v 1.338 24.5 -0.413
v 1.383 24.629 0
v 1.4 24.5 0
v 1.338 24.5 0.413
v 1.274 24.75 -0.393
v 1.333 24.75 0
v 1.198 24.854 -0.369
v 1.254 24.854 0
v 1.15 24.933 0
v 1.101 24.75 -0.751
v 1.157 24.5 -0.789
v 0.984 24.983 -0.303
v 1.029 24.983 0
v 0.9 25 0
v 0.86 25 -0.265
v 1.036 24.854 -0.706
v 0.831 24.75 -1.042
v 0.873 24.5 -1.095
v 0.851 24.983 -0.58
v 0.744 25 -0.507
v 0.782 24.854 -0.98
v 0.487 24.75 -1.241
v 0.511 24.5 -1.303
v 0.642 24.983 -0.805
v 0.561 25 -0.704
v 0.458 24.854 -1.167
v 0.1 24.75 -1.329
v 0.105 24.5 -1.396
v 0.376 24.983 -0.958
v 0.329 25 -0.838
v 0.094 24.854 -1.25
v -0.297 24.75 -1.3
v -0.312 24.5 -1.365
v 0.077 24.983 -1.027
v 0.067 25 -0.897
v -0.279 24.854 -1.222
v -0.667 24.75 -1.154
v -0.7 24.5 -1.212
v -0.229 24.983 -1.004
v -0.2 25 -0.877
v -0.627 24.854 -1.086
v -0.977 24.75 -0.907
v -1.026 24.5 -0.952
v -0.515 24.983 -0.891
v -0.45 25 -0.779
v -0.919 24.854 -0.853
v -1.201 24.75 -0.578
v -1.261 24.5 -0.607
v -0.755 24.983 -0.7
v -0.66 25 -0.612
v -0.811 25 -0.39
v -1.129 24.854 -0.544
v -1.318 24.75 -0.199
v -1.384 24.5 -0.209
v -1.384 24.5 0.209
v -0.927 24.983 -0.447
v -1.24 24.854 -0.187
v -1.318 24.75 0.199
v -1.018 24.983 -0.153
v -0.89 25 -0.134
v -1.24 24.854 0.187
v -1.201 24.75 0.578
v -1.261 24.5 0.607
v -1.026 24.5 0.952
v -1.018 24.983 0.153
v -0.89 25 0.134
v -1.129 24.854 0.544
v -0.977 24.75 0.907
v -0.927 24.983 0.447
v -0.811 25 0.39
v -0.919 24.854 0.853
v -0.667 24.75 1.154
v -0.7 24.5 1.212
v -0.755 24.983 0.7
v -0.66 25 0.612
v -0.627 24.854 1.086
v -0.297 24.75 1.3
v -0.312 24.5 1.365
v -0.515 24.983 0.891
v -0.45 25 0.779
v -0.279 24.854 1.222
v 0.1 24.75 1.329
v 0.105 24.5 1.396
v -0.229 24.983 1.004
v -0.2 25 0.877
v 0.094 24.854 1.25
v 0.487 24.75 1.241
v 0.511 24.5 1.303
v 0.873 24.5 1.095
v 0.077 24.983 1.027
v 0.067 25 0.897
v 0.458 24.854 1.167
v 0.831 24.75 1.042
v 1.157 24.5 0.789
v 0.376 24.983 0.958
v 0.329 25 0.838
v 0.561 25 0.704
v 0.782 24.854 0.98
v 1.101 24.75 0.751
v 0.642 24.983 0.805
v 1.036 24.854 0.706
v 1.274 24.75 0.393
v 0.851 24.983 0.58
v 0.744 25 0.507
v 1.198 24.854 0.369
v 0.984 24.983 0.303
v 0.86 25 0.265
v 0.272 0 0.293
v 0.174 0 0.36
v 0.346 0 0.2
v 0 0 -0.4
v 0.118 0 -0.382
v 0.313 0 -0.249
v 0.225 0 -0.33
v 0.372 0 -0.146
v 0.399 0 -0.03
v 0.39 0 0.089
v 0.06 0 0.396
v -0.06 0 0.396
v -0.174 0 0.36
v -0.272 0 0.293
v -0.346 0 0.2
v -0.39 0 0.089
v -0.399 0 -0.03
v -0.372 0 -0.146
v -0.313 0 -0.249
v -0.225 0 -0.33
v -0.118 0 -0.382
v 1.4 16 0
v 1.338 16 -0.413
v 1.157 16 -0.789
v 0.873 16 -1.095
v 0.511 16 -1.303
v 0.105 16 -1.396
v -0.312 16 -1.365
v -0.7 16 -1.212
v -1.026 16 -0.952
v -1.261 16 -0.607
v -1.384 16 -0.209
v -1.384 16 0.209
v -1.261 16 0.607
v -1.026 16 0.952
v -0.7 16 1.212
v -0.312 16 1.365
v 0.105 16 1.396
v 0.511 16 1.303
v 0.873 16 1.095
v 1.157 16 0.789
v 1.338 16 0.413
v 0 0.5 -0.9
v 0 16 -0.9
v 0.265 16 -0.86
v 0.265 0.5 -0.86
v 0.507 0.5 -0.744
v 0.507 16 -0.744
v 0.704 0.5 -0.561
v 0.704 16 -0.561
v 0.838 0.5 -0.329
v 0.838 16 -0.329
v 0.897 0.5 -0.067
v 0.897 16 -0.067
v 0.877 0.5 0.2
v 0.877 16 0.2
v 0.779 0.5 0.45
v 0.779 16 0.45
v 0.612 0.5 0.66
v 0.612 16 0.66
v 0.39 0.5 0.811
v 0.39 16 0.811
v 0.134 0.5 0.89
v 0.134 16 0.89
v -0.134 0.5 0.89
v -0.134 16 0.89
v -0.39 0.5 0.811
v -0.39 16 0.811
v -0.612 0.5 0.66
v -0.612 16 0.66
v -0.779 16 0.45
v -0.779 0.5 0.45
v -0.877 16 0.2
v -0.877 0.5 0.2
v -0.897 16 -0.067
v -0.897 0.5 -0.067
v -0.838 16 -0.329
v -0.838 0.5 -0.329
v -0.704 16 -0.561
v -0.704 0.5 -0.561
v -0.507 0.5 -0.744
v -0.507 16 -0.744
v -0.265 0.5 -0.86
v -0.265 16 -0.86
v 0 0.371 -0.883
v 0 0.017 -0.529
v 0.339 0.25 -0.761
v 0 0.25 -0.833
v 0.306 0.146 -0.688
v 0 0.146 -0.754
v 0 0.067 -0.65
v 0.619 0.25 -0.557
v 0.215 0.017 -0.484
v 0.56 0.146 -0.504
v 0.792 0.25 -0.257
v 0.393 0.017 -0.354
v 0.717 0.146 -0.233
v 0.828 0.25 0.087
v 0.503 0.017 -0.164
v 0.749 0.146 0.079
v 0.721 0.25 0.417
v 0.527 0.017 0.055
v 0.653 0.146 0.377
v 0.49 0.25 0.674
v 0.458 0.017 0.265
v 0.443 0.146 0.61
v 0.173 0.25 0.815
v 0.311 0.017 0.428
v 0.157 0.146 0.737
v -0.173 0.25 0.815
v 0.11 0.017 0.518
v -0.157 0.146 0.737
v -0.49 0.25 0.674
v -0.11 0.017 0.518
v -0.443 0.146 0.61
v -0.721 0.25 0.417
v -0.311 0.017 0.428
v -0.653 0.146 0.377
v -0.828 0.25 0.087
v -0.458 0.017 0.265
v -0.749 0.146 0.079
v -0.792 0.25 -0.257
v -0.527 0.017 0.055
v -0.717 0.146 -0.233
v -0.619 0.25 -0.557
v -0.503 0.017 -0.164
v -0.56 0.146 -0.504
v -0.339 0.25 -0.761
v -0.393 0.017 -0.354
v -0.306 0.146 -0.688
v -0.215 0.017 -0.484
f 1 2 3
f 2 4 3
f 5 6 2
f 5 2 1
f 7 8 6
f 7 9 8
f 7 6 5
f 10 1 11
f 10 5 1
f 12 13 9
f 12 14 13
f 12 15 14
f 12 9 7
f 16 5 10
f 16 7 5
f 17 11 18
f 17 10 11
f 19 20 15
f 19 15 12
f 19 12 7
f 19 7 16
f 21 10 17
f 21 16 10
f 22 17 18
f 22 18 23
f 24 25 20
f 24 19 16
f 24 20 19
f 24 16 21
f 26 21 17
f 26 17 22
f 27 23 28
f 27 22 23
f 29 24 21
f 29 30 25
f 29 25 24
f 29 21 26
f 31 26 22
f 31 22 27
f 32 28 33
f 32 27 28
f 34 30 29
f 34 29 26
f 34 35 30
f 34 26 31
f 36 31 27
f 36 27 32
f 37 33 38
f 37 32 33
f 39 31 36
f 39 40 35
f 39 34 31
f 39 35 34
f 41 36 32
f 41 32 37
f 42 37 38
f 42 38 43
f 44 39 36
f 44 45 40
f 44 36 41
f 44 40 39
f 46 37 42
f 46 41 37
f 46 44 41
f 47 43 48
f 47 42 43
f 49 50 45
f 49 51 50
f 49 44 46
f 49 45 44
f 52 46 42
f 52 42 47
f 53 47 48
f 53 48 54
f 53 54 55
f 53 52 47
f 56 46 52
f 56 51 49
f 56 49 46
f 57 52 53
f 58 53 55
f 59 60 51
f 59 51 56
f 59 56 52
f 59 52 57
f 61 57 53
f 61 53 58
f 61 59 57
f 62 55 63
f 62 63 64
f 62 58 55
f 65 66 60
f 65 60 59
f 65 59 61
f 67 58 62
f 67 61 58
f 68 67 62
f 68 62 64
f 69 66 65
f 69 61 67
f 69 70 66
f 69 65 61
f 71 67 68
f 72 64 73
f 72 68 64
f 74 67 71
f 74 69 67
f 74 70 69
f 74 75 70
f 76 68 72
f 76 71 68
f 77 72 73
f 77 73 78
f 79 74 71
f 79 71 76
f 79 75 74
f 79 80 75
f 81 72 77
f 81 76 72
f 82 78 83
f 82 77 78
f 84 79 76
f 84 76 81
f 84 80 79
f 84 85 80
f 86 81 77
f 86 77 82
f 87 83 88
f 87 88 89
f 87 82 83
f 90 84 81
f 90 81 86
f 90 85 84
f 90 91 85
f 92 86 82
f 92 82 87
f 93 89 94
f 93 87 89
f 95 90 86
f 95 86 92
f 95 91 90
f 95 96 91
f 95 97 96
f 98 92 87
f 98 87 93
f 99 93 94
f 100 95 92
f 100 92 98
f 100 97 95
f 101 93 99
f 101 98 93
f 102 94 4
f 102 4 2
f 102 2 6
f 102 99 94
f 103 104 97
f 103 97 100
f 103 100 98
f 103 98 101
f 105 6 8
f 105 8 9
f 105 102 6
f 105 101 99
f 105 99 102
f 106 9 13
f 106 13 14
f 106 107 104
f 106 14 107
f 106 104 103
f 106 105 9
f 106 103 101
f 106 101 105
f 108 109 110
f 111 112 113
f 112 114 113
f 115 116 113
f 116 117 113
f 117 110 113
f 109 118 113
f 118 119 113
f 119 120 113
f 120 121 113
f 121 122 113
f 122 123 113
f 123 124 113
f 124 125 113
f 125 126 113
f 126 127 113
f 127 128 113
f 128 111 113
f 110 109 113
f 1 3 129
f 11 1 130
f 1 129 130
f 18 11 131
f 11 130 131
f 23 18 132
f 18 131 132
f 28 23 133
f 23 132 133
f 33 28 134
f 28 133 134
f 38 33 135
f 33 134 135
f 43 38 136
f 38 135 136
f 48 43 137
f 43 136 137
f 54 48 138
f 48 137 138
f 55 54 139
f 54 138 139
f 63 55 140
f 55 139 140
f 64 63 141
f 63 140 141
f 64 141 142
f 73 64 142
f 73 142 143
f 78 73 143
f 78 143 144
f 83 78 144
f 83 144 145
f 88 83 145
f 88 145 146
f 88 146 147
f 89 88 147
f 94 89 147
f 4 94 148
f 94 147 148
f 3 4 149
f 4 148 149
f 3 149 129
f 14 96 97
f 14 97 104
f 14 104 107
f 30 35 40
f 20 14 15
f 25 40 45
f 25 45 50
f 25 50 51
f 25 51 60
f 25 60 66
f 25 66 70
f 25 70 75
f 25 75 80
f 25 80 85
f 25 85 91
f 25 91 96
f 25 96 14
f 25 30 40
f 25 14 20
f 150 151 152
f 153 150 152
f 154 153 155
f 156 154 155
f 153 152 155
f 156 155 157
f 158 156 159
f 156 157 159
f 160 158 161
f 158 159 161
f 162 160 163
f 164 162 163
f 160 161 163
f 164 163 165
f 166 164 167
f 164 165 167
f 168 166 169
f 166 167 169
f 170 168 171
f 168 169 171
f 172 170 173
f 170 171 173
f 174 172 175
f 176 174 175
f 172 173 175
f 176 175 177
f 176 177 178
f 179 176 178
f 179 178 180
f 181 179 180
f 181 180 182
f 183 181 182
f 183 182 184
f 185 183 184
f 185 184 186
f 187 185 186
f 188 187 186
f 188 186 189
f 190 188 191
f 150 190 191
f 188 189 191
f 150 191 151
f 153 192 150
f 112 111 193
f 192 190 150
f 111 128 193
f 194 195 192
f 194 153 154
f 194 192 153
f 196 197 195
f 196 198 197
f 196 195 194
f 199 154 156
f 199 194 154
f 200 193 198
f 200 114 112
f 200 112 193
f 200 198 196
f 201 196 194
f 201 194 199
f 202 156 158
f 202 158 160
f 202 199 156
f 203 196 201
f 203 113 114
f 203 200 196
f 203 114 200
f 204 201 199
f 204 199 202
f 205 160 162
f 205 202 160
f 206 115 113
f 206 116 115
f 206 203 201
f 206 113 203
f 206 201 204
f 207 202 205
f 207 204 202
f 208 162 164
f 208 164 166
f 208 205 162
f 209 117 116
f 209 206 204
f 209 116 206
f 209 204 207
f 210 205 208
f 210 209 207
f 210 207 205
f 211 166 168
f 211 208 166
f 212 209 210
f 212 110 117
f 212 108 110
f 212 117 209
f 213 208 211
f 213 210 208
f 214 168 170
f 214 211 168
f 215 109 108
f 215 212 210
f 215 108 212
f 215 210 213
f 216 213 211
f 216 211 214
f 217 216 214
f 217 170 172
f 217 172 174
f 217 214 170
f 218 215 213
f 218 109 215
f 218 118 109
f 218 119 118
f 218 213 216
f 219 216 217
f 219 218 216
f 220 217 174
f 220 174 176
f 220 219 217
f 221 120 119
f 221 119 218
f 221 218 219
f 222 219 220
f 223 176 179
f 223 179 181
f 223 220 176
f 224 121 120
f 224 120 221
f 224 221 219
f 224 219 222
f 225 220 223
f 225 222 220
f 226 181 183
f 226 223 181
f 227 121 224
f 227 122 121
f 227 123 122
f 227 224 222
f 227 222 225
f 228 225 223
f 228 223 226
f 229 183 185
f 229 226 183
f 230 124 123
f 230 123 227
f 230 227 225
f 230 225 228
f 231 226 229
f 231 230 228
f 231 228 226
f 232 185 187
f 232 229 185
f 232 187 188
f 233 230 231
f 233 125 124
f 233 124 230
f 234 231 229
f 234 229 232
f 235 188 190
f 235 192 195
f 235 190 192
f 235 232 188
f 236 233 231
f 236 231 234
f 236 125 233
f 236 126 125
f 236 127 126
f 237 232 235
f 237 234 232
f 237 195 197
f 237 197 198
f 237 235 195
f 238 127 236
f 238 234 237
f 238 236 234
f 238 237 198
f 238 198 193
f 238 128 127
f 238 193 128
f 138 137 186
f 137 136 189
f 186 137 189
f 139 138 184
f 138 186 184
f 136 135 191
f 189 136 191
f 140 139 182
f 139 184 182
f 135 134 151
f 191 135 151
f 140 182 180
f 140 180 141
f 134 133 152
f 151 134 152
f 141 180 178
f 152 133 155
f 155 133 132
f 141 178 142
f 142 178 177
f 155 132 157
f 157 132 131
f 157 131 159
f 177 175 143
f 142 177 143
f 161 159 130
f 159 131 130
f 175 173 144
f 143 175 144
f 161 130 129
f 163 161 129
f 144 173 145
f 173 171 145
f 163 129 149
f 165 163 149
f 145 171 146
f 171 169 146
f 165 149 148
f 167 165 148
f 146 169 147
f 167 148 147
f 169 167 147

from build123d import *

# Parameters (mm, degrees)
SKETCH_1_R      = 1.4
EXTRUDE_1_DEPTH = 25
SKETCH_2_W      = 0.5
SKETCH_2_H      = 16
FILLET_1_R      = 0.5


with BuildPart() as part:
    # 草图1 → 凸台-拉伸1 (new body)
    with BuildSketch(Plane(origin=(0, 0, 0), x_dir=(1, 0, 0), z_dir=(0, 1, 0))):
        Circle(SKETCH_1_R)
    extrude(amount=EXTRUDE_1_DEPTH)

    # 草图2 → 切除-旋转1 (revolve, cut)
    with BuildSketch(Plane(origin=(0, 0, 0), x_dir=(0, 0, -1), z_dir=(1, 0, 0))):
        with Locations((1.15, 8)):
            Rectangle(SKETCH_2_W, SKETCH_2_H)
    revolve(axis=Axis((0, 0, 0), (0, -1, 0)), mode=Mode.SUBTRACT)

    # 圆角1
    fillet_1_edges = [part.edges().sort_by_distance(p)[0] for p in [
        (-1.4, 25, 0),
        (0, 0, 0.9),
    ]]
    fillet(fillet_1_edges, radius=FILLET_1_R)


solid = part.part
